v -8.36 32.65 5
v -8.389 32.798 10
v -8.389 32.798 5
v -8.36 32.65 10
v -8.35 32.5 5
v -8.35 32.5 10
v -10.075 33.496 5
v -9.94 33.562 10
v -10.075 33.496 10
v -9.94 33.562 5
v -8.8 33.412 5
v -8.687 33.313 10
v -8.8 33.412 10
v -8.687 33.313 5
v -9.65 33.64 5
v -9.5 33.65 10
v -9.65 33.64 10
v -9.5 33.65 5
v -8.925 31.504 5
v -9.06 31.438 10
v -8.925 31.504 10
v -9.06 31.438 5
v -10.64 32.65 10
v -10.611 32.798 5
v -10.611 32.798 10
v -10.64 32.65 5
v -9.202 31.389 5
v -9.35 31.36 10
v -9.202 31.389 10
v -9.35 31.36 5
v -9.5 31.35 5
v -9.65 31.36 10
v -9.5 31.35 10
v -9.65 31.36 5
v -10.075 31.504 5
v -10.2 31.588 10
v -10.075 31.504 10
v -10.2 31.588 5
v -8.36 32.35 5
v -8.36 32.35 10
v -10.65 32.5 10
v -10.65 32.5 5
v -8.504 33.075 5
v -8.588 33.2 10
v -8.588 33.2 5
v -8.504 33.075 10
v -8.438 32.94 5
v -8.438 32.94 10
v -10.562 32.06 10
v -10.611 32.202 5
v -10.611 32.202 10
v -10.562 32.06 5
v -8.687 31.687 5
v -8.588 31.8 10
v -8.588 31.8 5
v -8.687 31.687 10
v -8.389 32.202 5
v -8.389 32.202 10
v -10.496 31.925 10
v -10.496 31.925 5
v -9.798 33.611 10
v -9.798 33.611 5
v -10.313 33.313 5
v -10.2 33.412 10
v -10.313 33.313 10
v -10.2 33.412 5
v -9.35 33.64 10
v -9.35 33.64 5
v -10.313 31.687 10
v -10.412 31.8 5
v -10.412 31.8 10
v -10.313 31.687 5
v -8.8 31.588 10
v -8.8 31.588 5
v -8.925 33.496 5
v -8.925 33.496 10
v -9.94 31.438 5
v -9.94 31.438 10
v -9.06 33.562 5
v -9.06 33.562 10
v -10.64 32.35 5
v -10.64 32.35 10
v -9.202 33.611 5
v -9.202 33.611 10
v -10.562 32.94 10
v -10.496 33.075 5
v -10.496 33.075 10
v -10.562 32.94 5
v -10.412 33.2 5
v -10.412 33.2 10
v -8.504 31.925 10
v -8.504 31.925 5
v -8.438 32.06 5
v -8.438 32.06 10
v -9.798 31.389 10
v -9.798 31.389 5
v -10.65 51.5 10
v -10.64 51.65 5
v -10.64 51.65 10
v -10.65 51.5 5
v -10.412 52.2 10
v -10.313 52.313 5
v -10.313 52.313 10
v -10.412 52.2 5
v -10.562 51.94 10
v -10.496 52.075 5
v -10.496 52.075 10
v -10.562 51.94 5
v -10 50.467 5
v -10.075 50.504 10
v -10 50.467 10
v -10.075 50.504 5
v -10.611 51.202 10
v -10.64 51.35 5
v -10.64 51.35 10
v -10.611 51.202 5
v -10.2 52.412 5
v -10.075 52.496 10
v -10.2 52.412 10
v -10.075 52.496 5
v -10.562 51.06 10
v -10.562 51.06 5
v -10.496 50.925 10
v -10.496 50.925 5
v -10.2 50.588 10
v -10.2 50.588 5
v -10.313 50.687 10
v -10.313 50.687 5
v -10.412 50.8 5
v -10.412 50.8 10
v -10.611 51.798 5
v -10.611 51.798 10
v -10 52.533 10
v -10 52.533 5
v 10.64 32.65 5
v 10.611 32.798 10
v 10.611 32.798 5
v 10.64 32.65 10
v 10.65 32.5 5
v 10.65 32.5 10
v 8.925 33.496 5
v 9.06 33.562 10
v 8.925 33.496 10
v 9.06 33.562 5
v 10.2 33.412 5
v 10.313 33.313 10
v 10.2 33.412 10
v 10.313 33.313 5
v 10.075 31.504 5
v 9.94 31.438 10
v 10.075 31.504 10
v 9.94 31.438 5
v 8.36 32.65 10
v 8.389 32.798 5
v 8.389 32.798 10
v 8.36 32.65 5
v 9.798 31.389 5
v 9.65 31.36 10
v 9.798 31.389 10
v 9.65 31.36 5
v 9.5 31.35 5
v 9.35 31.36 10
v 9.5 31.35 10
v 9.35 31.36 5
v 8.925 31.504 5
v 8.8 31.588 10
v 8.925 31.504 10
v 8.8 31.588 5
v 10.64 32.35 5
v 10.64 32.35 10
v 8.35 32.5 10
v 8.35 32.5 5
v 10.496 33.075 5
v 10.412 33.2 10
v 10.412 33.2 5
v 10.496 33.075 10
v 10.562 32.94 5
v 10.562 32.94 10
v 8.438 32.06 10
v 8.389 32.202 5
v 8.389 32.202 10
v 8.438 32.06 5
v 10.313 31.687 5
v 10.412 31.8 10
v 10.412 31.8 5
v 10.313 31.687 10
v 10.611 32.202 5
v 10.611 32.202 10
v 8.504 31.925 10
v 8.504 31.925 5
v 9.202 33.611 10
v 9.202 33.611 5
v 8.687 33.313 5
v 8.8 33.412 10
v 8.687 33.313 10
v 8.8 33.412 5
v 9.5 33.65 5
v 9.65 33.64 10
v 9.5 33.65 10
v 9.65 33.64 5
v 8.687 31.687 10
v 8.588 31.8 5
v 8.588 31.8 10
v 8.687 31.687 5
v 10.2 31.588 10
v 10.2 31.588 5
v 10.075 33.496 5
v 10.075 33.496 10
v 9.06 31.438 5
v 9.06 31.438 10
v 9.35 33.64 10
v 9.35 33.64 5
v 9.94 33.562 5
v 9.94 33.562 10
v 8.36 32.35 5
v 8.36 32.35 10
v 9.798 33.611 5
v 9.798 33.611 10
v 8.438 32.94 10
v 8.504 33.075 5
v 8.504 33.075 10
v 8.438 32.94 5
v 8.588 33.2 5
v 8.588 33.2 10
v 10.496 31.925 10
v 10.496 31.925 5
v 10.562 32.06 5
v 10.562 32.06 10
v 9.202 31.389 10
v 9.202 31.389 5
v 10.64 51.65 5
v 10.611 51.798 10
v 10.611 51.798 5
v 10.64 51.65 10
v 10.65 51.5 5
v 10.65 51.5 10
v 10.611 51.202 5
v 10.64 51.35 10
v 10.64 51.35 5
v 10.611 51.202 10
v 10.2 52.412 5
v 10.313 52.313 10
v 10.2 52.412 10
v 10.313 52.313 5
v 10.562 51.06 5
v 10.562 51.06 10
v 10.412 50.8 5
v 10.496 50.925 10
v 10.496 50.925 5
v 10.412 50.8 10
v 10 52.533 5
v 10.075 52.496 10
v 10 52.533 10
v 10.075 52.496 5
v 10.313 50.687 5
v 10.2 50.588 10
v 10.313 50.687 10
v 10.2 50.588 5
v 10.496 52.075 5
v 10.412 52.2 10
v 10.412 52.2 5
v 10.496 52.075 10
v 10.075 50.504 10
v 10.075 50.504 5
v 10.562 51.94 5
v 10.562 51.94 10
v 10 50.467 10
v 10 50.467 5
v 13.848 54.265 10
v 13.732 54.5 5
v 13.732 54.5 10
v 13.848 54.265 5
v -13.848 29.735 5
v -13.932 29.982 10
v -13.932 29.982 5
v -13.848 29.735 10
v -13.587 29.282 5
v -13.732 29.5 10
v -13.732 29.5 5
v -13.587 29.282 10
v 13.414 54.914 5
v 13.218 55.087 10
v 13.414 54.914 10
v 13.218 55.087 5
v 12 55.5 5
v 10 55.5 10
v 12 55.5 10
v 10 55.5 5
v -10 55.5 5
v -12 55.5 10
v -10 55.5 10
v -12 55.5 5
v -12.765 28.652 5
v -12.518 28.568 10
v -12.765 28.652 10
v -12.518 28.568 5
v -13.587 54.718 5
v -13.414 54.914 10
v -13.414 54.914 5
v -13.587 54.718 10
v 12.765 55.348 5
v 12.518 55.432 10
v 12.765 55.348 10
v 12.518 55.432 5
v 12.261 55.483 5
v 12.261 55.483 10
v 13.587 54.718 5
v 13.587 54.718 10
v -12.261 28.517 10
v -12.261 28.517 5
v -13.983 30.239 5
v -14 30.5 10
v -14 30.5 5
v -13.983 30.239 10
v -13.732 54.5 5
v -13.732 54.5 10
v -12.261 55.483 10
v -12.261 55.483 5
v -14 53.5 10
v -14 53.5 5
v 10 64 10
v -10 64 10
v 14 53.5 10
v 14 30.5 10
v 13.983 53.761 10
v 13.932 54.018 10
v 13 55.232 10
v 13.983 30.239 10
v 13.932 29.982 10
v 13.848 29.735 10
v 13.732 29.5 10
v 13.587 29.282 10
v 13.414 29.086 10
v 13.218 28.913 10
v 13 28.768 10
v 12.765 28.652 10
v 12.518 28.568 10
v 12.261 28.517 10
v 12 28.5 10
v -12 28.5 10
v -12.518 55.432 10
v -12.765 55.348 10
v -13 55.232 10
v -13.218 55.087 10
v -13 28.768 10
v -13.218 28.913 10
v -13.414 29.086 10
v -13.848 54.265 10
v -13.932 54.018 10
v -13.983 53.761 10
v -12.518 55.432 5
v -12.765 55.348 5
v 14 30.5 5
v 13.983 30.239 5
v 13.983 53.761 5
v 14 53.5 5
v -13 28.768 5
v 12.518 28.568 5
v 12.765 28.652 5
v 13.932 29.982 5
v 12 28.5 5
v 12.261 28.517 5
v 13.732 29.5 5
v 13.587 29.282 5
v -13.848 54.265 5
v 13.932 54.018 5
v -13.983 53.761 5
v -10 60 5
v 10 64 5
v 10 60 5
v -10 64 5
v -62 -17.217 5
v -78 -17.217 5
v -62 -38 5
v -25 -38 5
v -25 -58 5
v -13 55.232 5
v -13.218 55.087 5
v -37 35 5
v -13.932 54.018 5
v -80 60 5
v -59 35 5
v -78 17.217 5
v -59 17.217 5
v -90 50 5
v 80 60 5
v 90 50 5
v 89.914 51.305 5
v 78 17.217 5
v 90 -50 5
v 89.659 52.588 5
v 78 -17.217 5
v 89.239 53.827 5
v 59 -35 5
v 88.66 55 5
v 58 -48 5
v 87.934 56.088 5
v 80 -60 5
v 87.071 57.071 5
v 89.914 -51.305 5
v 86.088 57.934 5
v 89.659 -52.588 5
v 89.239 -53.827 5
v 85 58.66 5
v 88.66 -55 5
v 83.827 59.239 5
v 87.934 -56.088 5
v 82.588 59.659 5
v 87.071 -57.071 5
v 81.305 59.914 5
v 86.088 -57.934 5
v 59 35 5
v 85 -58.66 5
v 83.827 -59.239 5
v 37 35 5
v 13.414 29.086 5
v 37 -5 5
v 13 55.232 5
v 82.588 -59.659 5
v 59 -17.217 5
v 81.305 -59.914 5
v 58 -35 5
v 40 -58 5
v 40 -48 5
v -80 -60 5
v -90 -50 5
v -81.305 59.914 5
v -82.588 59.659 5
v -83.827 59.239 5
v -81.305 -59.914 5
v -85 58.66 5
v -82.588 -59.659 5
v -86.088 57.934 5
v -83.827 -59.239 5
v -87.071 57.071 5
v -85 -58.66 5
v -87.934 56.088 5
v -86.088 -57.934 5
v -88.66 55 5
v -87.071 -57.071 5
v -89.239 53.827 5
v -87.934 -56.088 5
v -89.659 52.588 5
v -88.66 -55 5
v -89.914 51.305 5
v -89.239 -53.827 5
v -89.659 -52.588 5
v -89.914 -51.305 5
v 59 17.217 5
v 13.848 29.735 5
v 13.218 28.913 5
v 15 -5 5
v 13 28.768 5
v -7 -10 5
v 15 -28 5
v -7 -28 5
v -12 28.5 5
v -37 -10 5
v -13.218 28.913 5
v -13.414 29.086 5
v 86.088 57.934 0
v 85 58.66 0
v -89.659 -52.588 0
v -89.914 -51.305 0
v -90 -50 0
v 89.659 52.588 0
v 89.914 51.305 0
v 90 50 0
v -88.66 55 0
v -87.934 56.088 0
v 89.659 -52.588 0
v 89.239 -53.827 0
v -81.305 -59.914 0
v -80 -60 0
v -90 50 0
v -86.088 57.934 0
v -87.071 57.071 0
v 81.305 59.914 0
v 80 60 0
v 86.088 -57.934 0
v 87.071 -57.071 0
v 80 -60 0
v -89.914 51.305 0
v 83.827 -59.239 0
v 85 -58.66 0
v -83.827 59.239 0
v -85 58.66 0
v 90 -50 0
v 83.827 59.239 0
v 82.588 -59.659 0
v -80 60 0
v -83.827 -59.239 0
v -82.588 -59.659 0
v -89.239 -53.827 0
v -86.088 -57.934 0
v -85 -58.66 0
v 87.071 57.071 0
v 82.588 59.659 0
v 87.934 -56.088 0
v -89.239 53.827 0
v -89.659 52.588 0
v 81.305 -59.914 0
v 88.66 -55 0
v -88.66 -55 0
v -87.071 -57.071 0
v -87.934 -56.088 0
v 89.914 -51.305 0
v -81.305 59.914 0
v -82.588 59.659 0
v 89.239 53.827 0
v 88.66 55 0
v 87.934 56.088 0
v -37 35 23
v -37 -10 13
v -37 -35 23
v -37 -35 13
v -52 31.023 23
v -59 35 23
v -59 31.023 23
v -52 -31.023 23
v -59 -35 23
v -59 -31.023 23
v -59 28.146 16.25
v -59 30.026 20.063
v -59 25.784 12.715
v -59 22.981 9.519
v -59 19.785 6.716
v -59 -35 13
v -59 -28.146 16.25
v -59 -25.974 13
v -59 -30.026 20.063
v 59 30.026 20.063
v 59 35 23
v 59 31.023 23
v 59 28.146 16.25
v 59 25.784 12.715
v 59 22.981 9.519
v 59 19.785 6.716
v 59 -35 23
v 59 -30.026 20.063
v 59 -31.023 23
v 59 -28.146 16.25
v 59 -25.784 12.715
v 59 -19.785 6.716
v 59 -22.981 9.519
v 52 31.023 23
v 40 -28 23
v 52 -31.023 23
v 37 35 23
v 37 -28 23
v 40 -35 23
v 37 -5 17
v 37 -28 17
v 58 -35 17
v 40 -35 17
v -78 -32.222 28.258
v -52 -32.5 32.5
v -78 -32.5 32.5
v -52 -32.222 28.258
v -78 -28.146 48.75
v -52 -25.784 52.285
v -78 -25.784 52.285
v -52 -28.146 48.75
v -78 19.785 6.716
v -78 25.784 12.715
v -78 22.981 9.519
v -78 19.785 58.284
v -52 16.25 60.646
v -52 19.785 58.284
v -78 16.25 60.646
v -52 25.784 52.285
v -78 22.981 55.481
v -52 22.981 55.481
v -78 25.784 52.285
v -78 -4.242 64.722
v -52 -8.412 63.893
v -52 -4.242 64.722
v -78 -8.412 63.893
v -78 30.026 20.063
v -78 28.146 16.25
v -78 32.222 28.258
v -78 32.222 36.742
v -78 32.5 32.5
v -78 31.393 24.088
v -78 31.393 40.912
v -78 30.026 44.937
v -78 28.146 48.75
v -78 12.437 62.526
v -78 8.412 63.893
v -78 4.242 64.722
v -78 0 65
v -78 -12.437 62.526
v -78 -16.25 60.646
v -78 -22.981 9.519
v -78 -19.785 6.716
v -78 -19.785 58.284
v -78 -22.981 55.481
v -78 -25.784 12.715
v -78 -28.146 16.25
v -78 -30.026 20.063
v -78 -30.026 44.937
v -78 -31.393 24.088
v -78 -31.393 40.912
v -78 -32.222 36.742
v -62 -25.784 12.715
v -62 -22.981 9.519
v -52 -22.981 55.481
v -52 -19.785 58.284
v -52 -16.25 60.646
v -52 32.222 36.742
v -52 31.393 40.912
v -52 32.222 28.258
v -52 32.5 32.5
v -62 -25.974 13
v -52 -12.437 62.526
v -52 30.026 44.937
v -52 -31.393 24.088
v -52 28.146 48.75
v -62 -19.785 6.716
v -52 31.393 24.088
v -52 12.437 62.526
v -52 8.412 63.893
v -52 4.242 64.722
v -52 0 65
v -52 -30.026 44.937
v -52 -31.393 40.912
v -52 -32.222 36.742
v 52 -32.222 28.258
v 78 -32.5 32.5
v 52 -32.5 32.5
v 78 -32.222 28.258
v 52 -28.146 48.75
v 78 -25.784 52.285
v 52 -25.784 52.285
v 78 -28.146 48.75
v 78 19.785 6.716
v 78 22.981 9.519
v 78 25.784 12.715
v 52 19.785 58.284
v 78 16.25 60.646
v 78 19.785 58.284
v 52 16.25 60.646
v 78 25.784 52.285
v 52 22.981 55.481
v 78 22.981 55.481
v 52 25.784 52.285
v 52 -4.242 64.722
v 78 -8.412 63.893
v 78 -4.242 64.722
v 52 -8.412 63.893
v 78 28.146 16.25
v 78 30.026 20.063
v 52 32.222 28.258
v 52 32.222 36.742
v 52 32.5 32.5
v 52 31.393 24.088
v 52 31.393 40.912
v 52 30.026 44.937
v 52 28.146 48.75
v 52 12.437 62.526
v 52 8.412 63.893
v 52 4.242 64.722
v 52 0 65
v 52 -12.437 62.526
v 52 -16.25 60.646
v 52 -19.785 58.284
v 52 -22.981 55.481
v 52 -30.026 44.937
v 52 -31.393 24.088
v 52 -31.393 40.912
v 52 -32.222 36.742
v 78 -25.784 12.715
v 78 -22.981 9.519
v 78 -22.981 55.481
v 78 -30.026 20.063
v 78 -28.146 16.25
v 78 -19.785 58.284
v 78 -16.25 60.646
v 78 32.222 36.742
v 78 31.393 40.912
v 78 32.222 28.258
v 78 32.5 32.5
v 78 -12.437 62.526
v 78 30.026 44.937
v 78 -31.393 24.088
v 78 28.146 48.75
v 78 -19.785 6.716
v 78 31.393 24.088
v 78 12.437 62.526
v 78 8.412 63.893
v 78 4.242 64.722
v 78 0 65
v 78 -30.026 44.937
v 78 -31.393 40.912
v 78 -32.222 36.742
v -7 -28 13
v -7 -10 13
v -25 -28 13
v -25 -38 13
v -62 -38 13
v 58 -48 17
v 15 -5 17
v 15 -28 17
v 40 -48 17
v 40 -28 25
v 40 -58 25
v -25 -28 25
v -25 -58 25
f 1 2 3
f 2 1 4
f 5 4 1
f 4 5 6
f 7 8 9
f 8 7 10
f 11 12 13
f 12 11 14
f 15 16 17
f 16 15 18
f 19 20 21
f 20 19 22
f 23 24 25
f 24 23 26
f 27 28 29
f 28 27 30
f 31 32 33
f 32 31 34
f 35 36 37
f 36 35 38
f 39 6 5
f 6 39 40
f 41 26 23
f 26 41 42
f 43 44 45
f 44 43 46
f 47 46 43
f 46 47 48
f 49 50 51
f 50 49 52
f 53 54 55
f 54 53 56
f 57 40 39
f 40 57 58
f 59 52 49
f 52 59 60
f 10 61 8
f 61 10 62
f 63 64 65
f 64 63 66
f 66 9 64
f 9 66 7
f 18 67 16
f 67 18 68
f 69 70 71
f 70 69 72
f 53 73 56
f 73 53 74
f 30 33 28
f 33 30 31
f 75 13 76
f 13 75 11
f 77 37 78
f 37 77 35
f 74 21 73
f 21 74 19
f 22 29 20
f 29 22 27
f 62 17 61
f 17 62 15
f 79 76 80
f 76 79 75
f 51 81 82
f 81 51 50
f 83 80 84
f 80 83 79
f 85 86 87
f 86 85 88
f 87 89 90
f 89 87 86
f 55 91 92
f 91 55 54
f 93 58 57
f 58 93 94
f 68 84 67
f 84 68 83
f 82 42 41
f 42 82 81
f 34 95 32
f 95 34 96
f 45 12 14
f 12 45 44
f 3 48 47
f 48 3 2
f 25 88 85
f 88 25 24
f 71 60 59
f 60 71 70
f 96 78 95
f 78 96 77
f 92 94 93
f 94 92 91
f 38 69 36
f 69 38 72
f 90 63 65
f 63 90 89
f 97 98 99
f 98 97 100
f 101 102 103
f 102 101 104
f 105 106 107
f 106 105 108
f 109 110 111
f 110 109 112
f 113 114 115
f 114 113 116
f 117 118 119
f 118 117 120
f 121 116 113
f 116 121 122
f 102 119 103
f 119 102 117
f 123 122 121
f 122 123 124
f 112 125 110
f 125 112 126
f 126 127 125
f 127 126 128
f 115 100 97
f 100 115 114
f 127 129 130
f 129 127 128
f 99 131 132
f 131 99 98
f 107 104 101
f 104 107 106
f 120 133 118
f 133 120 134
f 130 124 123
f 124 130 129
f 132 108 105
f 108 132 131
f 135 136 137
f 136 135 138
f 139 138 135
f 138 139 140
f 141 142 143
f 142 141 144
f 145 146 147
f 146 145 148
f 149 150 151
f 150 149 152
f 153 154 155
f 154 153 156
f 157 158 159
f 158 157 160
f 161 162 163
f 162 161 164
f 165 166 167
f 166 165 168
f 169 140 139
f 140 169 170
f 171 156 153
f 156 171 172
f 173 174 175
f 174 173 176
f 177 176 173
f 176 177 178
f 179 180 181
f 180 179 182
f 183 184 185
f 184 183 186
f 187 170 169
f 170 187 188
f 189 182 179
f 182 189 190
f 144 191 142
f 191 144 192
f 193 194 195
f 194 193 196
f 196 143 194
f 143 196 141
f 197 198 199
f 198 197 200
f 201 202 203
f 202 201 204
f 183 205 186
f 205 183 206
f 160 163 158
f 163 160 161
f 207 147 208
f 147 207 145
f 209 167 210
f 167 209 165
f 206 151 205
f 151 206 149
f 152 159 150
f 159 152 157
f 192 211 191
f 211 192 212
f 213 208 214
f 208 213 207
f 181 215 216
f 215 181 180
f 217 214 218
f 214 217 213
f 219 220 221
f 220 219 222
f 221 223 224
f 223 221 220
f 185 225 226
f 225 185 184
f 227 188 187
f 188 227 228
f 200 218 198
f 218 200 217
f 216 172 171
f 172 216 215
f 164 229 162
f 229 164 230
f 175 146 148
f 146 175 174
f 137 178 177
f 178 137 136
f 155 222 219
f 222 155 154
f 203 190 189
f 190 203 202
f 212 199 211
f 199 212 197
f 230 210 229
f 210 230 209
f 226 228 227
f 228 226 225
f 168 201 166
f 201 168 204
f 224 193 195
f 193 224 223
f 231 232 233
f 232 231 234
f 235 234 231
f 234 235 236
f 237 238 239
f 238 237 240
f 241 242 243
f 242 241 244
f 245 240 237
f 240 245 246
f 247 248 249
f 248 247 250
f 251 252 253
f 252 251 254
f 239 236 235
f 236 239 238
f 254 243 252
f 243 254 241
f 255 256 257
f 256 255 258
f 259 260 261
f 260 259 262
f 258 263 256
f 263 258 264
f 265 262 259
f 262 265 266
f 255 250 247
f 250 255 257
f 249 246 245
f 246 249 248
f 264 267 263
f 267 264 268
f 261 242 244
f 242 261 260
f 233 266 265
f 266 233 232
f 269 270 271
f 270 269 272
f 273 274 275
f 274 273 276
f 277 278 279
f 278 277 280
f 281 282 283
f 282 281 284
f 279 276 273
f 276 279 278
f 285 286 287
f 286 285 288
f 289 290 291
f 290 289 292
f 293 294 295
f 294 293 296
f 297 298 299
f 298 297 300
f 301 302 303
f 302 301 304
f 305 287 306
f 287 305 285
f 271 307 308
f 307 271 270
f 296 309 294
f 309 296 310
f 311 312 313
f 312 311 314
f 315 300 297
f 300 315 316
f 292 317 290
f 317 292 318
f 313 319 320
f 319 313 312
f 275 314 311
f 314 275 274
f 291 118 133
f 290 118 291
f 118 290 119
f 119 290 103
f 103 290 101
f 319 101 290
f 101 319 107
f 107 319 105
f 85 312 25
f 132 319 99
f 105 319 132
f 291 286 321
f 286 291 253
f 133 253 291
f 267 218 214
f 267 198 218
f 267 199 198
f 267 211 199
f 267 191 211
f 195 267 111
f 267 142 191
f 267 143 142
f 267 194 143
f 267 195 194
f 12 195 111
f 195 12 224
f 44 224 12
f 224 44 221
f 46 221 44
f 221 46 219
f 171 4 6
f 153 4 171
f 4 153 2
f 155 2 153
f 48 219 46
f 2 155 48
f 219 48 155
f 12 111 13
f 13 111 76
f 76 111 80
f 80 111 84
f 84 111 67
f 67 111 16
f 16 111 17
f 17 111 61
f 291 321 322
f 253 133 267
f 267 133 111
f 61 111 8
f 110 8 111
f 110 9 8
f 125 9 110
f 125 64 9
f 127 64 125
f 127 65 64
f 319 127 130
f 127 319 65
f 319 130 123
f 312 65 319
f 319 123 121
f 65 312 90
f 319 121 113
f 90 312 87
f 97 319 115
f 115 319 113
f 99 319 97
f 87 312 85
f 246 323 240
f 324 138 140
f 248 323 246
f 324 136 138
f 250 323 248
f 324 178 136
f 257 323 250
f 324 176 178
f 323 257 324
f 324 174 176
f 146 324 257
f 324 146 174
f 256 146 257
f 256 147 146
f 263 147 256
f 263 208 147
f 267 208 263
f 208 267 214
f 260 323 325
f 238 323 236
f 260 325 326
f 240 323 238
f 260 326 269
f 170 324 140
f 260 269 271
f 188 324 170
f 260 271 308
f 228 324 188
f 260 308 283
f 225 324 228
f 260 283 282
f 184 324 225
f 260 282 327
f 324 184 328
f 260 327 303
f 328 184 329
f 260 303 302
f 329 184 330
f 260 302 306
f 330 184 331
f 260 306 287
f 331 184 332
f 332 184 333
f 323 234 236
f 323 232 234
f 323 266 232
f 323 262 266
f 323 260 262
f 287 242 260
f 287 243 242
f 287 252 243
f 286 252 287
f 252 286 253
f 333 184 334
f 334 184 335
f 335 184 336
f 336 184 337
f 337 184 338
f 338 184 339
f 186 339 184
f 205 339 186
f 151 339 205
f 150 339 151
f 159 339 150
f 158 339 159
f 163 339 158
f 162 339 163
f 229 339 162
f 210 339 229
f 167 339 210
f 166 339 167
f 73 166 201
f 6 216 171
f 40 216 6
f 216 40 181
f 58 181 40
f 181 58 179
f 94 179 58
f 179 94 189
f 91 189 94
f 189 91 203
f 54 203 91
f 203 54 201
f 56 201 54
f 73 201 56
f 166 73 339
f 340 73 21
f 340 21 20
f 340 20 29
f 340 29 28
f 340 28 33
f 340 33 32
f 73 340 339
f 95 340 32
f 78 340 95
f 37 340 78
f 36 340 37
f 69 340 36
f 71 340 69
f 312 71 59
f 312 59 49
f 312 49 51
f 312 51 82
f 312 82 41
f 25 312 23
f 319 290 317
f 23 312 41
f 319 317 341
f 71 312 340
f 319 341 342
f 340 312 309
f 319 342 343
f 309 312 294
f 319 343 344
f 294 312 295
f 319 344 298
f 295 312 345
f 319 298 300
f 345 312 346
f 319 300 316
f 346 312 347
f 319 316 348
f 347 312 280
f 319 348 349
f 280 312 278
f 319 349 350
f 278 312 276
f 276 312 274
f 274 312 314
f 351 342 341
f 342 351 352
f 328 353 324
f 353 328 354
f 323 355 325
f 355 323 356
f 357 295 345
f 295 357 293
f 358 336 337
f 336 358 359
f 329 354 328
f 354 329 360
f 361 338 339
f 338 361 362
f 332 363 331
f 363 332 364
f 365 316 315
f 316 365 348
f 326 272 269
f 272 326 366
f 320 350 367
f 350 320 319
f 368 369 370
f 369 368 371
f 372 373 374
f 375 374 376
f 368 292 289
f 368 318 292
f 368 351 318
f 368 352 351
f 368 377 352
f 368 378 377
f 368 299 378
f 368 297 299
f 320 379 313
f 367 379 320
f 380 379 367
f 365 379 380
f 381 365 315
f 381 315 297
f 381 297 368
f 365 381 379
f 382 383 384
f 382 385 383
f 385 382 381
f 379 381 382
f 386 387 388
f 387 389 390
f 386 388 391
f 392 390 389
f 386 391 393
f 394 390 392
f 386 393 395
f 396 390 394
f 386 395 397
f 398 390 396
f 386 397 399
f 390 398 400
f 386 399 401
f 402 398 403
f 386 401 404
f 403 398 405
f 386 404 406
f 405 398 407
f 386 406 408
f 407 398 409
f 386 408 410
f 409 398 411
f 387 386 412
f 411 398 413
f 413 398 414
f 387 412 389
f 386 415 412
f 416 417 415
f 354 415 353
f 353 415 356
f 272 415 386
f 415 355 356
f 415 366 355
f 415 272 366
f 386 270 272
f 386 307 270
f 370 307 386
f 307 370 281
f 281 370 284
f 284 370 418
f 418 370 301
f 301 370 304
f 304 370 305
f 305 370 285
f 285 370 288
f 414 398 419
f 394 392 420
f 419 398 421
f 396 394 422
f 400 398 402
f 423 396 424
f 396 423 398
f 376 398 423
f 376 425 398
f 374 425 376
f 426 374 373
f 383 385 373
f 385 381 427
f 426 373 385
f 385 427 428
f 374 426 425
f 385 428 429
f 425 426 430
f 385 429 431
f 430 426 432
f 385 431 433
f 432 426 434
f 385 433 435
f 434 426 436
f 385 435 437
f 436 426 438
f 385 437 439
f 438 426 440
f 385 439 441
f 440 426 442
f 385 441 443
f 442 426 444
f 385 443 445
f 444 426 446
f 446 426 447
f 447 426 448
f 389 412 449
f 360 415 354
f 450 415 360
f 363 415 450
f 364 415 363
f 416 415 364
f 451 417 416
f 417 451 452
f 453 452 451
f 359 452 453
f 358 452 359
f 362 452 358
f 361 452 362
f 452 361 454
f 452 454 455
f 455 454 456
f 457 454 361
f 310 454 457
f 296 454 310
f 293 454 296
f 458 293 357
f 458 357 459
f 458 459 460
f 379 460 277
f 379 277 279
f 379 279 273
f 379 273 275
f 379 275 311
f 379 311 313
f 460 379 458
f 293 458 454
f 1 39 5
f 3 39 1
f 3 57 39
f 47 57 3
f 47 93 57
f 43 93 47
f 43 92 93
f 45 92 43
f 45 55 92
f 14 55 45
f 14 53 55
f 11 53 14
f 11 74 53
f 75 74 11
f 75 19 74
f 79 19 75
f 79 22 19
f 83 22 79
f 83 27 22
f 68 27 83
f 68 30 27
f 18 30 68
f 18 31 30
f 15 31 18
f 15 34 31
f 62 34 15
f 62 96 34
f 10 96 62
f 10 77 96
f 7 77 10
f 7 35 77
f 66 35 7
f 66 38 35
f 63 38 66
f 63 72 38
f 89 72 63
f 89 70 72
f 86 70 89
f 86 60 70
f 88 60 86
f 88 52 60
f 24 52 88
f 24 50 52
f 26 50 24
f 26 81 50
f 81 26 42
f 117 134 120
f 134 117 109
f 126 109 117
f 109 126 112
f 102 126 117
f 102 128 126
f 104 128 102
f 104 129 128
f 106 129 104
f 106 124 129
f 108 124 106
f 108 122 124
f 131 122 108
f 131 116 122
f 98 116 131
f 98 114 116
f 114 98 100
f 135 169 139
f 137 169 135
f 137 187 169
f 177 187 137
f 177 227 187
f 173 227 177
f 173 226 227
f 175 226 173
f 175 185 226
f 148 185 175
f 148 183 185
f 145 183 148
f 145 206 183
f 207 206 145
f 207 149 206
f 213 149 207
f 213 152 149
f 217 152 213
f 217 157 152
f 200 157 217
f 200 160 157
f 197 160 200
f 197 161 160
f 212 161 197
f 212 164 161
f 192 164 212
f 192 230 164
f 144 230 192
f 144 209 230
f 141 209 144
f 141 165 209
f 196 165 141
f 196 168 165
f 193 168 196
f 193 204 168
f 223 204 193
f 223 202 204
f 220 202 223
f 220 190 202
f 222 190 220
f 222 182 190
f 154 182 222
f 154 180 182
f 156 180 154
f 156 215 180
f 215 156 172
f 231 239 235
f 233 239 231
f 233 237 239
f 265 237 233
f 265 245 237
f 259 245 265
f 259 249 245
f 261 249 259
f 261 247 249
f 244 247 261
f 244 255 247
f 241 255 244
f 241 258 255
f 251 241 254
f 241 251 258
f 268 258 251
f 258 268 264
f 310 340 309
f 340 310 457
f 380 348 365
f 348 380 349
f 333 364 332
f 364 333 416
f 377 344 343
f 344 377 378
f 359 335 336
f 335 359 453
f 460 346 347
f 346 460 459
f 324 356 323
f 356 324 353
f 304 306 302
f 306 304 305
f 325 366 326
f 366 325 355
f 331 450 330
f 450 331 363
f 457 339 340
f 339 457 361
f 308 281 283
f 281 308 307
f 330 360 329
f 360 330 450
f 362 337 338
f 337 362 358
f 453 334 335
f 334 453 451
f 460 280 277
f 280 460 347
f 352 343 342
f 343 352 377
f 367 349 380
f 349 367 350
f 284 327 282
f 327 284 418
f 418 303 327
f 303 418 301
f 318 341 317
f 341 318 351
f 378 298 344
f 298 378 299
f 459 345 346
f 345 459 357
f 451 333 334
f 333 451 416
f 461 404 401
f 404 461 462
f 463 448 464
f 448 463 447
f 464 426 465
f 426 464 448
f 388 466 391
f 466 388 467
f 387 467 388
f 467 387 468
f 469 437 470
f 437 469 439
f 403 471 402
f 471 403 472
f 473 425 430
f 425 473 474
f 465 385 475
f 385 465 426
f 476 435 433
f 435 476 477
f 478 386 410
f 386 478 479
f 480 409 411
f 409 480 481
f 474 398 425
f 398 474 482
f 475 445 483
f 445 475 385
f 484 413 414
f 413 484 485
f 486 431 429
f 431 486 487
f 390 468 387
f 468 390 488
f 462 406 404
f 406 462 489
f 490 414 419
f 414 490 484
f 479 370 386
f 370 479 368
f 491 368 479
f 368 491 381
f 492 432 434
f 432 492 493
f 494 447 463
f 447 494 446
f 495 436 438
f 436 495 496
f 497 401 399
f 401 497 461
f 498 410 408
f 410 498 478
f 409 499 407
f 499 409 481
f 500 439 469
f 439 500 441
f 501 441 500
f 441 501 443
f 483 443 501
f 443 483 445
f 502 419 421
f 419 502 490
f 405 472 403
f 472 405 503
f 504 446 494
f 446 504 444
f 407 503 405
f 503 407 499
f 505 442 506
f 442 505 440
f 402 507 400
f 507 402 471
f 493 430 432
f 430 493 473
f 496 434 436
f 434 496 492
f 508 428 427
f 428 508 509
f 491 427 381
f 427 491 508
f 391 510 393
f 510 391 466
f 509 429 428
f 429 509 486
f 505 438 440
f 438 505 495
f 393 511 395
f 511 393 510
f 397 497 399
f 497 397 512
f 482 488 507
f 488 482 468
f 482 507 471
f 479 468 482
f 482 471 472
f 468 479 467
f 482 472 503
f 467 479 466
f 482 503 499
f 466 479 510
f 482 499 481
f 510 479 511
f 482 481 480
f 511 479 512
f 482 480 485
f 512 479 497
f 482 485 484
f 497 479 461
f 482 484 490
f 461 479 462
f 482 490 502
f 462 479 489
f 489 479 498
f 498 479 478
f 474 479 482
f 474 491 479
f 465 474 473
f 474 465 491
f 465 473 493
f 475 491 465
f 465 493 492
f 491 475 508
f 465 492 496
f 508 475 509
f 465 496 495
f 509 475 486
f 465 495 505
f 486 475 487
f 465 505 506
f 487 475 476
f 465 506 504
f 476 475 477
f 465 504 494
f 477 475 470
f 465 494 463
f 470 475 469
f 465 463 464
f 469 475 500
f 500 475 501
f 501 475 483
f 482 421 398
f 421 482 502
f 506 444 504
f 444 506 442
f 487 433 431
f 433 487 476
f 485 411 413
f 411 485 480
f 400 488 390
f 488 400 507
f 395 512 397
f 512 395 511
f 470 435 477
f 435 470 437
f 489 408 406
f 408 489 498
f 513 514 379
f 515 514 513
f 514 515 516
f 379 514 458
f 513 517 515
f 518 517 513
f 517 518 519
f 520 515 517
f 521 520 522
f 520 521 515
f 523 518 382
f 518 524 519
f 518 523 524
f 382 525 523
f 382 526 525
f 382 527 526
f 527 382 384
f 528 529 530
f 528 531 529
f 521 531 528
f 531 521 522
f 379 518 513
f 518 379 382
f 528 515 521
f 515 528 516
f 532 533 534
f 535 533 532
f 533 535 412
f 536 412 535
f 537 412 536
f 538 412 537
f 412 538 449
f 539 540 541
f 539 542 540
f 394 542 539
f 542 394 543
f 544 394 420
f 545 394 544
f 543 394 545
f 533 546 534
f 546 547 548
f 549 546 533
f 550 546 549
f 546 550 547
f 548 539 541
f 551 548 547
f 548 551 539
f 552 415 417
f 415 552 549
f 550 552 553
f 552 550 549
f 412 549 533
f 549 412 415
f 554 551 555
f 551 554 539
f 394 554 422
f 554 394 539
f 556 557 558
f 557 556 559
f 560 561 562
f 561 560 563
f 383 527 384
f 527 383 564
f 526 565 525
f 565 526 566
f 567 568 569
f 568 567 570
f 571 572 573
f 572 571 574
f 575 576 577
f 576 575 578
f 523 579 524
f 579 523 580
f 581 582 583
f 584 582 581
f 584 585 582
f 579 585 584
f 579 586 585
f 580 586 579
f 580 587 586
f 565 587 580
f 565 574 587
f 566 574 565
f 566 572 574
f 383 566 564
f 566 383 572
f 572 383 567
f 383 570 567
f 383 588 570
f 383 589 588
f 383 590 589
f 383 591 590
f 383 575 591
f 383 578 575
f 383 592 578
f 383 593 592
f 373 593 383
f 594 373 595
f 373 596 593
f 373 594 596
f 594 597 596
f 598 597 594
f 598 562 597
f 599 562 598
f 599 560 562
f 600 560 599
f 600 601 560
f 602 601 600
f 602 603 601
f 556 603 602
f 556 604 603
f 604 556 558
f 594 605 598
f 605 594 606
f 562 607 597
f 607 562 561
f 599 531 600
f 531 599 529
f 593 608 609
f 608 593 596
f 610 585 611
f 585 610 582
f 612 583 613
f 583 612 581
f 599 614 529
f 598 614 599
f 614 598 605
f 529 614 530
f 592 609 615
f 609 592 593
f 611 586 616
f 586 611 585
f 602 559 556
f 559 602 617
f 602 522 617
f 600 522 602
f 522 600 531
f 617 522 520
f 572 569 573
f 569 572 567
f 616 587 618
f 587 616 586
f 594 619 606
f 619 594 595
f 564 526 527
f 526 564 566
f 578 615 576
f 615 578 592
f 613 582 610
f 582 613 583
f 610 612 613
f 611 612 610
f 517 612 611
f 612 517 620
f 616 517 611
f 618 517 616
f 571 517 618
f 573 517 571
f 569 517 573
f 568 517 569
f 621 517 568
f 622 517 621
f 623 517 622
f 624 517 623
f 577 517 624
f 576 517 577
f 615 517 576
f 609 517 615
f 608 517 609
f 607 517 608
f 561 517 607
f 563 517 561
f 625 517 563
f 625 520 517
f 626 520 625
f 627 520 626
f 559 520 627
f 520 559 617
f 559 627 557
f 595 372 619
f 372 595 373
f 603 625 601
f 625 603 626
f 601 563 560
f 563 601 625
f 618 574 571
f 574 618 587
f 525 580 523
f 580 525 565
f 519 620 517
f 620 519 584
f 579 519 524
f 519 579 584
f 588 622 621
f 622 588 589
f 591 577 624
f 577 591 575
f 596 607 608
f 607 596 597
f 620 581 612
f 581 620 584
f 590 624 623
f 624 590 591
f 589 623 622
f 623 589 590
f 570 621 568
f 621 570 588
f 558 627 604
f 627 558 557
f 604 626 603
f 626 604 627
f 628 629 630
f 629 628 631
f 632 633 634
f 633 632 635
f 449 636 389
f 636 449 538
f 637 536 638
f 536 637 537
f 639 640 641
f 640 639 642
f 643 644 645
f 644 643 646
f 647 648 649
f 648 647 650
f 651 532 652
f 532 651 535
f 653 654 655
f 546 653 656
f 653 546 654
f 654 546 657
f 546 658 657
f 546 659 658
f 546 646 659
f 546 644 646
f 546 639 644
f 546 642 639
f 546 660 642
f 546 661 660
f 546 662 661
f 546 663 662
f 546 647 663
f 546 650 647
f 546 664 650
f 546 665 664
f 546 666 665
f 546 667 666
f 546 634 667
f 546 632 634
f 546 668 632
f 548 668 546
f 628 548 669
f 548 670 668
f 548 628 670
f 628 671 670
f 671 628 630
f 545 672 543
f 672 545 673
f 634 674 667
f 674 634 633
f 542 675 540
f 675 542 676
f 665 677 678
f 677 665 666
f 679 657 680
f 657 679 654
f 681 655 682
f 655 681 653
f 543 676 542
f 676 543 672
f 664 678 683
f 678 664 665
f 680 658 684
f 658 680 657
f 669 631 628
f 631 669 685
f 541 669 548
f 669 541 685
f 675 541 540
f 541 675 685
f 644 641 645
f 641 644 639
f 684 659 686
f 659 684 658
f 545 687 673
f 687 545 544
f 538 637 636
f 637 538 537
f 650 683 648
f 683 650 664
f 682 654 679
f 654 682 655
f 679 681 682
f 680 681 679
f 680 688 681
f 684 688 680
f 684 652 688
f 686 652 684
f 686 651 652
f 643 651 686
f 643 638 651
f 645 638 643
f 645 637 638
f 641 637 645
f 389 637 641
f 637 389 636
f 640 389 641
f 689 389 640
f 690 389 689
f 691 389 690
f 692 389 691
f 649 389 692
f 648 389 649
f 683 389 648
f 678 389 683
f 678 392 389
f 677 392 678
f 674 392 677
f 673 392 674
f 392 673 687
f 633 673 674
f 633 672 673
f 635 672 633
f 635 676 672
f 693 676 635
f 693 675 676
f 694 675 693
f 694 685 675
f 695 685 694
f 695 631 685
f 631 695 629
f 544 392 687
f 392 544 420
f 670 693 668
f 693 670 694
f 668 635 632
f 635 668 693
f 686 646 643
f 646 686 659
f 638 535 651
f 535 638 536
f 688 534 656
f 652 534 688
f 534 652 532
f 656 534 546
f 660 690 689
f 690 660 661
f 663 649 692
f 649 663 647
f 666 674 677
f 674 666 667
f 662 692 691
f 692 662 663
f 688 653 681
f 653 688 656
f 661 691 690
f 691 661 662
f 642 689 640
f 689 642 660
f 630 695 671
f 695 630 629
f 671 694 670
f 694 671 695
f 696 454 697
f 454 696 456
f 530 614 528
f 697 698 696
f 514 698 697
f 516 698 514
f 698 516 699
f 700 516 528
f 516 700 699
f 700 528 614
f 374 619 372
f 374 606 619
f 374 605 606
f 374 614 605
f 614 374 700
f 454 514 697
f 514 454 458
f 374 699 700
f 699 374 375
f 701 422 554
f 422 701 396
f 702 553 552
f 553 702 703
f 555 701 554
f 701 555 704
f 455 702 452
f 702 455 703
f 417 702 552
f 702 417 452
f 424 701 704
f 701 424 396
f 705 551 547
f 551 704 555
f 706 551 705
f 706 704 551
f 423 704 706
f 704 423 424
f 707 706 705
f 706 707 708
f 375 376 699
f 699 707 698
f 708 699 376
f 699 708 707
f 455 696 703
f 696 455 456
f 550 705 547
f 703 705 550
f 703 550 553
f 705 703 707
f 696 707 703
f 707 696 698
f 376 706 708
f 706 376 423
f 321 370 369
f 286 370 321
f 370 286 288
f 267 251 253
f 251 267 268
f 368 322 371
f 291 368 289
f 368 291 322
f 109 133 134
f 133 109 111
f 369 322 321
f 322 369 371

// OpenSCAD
/*
 TITAN HAND CAR — conceptual chassis layout
 Units: mm. This is a fit-planning model, not manufacturing-ready.
 Verify all component dimensions and mounting holes first.
*/
$fn = 48;

base_L = 180;
base_W = 120;
base_T = 5;
corner_R = 10;

motor_L = 70;
motor_W = 22;
motor_H = 18;
motor_spacing_from_center = 48;

wheel_D = 65;      // placeholder: measure your actual wheels
wheel_W = 26;      // placeholder
wheel_x = 65;

caster_plate_L = 28;
caster_plate_W = 27;
caster_plate_T = 5;
caster_hole_spacing = 19; // assumed square pattern; verify actual pattern
caster_hole_D = 2.3;      // assumed M2 clearance; verify screw size
caster_y = 42;

module rounded2d(l,w,r) {
  hull() for (x=[-l/2+r,l/2-r])
    for (y=[-w/2+r,w/2-r])
      translate([x,y]) circle(r);
}

module base() {
  color("dimgray")
    linear_extrude(base_T) rounded2d(base_L,base_W,corner_R);
}

module motor_block(x) {
  translate([x,0,base_T+motor_H/2])
    color("gold") cube([motor_W,motor_L,motor_H],center=true);
}

module wheel(x) {
  translate([x,0,wheel_D/2])
    rotate([0,90,0])
      color("black") cylinder(d=wheel_D,h=wheel_W,center=true);
}

module caster_plate() {
  translate([0,caster_y,base_T])
    color("silver")
      difference() {
        linear_extrude(caster_plate_T)
          rounded2d(caster_plate_L,caster_plate_W,2);
        for (x=[-caster_hole_spacing/2,caster_hole_spacing/2])
          for (y=[-caster_hole_spacing/2,caster_hole_spacing/2])
            translate([x,y,-0.1])
              cylinder(d=caster_hole_D,h=caster_plate_T+0.2);
      }
}

module component_envelope(x,y,l,w,h,label) {
  translate([x,y,base_T])
    color(label) cube([l,w,h],center=false);
}

base();

// Motor visual envelopes
motor_block(-motor_spacing_from_center);
motor_block(motor_spacing_from_center);

// Wheel visual envelopes (shaft alignment must be verified)
wheel(-wheel_x);
wheel(wheel_x);

// Caster plate envelope
caster_plate();

// Approximate electronics envelopes — not drilled mounting holes
component_envelope(-62,-38,55,28,8,"forestgreen"); // ESP32 area
component_envelope(15,-48,43,43,12,"firebrick");   // L298N area
component_envelope(-25,-58,65,30,20,"royalblue");  // battery area
component_envelope(-10,48,20,16,5,"purple");       // APDS-9960 area
